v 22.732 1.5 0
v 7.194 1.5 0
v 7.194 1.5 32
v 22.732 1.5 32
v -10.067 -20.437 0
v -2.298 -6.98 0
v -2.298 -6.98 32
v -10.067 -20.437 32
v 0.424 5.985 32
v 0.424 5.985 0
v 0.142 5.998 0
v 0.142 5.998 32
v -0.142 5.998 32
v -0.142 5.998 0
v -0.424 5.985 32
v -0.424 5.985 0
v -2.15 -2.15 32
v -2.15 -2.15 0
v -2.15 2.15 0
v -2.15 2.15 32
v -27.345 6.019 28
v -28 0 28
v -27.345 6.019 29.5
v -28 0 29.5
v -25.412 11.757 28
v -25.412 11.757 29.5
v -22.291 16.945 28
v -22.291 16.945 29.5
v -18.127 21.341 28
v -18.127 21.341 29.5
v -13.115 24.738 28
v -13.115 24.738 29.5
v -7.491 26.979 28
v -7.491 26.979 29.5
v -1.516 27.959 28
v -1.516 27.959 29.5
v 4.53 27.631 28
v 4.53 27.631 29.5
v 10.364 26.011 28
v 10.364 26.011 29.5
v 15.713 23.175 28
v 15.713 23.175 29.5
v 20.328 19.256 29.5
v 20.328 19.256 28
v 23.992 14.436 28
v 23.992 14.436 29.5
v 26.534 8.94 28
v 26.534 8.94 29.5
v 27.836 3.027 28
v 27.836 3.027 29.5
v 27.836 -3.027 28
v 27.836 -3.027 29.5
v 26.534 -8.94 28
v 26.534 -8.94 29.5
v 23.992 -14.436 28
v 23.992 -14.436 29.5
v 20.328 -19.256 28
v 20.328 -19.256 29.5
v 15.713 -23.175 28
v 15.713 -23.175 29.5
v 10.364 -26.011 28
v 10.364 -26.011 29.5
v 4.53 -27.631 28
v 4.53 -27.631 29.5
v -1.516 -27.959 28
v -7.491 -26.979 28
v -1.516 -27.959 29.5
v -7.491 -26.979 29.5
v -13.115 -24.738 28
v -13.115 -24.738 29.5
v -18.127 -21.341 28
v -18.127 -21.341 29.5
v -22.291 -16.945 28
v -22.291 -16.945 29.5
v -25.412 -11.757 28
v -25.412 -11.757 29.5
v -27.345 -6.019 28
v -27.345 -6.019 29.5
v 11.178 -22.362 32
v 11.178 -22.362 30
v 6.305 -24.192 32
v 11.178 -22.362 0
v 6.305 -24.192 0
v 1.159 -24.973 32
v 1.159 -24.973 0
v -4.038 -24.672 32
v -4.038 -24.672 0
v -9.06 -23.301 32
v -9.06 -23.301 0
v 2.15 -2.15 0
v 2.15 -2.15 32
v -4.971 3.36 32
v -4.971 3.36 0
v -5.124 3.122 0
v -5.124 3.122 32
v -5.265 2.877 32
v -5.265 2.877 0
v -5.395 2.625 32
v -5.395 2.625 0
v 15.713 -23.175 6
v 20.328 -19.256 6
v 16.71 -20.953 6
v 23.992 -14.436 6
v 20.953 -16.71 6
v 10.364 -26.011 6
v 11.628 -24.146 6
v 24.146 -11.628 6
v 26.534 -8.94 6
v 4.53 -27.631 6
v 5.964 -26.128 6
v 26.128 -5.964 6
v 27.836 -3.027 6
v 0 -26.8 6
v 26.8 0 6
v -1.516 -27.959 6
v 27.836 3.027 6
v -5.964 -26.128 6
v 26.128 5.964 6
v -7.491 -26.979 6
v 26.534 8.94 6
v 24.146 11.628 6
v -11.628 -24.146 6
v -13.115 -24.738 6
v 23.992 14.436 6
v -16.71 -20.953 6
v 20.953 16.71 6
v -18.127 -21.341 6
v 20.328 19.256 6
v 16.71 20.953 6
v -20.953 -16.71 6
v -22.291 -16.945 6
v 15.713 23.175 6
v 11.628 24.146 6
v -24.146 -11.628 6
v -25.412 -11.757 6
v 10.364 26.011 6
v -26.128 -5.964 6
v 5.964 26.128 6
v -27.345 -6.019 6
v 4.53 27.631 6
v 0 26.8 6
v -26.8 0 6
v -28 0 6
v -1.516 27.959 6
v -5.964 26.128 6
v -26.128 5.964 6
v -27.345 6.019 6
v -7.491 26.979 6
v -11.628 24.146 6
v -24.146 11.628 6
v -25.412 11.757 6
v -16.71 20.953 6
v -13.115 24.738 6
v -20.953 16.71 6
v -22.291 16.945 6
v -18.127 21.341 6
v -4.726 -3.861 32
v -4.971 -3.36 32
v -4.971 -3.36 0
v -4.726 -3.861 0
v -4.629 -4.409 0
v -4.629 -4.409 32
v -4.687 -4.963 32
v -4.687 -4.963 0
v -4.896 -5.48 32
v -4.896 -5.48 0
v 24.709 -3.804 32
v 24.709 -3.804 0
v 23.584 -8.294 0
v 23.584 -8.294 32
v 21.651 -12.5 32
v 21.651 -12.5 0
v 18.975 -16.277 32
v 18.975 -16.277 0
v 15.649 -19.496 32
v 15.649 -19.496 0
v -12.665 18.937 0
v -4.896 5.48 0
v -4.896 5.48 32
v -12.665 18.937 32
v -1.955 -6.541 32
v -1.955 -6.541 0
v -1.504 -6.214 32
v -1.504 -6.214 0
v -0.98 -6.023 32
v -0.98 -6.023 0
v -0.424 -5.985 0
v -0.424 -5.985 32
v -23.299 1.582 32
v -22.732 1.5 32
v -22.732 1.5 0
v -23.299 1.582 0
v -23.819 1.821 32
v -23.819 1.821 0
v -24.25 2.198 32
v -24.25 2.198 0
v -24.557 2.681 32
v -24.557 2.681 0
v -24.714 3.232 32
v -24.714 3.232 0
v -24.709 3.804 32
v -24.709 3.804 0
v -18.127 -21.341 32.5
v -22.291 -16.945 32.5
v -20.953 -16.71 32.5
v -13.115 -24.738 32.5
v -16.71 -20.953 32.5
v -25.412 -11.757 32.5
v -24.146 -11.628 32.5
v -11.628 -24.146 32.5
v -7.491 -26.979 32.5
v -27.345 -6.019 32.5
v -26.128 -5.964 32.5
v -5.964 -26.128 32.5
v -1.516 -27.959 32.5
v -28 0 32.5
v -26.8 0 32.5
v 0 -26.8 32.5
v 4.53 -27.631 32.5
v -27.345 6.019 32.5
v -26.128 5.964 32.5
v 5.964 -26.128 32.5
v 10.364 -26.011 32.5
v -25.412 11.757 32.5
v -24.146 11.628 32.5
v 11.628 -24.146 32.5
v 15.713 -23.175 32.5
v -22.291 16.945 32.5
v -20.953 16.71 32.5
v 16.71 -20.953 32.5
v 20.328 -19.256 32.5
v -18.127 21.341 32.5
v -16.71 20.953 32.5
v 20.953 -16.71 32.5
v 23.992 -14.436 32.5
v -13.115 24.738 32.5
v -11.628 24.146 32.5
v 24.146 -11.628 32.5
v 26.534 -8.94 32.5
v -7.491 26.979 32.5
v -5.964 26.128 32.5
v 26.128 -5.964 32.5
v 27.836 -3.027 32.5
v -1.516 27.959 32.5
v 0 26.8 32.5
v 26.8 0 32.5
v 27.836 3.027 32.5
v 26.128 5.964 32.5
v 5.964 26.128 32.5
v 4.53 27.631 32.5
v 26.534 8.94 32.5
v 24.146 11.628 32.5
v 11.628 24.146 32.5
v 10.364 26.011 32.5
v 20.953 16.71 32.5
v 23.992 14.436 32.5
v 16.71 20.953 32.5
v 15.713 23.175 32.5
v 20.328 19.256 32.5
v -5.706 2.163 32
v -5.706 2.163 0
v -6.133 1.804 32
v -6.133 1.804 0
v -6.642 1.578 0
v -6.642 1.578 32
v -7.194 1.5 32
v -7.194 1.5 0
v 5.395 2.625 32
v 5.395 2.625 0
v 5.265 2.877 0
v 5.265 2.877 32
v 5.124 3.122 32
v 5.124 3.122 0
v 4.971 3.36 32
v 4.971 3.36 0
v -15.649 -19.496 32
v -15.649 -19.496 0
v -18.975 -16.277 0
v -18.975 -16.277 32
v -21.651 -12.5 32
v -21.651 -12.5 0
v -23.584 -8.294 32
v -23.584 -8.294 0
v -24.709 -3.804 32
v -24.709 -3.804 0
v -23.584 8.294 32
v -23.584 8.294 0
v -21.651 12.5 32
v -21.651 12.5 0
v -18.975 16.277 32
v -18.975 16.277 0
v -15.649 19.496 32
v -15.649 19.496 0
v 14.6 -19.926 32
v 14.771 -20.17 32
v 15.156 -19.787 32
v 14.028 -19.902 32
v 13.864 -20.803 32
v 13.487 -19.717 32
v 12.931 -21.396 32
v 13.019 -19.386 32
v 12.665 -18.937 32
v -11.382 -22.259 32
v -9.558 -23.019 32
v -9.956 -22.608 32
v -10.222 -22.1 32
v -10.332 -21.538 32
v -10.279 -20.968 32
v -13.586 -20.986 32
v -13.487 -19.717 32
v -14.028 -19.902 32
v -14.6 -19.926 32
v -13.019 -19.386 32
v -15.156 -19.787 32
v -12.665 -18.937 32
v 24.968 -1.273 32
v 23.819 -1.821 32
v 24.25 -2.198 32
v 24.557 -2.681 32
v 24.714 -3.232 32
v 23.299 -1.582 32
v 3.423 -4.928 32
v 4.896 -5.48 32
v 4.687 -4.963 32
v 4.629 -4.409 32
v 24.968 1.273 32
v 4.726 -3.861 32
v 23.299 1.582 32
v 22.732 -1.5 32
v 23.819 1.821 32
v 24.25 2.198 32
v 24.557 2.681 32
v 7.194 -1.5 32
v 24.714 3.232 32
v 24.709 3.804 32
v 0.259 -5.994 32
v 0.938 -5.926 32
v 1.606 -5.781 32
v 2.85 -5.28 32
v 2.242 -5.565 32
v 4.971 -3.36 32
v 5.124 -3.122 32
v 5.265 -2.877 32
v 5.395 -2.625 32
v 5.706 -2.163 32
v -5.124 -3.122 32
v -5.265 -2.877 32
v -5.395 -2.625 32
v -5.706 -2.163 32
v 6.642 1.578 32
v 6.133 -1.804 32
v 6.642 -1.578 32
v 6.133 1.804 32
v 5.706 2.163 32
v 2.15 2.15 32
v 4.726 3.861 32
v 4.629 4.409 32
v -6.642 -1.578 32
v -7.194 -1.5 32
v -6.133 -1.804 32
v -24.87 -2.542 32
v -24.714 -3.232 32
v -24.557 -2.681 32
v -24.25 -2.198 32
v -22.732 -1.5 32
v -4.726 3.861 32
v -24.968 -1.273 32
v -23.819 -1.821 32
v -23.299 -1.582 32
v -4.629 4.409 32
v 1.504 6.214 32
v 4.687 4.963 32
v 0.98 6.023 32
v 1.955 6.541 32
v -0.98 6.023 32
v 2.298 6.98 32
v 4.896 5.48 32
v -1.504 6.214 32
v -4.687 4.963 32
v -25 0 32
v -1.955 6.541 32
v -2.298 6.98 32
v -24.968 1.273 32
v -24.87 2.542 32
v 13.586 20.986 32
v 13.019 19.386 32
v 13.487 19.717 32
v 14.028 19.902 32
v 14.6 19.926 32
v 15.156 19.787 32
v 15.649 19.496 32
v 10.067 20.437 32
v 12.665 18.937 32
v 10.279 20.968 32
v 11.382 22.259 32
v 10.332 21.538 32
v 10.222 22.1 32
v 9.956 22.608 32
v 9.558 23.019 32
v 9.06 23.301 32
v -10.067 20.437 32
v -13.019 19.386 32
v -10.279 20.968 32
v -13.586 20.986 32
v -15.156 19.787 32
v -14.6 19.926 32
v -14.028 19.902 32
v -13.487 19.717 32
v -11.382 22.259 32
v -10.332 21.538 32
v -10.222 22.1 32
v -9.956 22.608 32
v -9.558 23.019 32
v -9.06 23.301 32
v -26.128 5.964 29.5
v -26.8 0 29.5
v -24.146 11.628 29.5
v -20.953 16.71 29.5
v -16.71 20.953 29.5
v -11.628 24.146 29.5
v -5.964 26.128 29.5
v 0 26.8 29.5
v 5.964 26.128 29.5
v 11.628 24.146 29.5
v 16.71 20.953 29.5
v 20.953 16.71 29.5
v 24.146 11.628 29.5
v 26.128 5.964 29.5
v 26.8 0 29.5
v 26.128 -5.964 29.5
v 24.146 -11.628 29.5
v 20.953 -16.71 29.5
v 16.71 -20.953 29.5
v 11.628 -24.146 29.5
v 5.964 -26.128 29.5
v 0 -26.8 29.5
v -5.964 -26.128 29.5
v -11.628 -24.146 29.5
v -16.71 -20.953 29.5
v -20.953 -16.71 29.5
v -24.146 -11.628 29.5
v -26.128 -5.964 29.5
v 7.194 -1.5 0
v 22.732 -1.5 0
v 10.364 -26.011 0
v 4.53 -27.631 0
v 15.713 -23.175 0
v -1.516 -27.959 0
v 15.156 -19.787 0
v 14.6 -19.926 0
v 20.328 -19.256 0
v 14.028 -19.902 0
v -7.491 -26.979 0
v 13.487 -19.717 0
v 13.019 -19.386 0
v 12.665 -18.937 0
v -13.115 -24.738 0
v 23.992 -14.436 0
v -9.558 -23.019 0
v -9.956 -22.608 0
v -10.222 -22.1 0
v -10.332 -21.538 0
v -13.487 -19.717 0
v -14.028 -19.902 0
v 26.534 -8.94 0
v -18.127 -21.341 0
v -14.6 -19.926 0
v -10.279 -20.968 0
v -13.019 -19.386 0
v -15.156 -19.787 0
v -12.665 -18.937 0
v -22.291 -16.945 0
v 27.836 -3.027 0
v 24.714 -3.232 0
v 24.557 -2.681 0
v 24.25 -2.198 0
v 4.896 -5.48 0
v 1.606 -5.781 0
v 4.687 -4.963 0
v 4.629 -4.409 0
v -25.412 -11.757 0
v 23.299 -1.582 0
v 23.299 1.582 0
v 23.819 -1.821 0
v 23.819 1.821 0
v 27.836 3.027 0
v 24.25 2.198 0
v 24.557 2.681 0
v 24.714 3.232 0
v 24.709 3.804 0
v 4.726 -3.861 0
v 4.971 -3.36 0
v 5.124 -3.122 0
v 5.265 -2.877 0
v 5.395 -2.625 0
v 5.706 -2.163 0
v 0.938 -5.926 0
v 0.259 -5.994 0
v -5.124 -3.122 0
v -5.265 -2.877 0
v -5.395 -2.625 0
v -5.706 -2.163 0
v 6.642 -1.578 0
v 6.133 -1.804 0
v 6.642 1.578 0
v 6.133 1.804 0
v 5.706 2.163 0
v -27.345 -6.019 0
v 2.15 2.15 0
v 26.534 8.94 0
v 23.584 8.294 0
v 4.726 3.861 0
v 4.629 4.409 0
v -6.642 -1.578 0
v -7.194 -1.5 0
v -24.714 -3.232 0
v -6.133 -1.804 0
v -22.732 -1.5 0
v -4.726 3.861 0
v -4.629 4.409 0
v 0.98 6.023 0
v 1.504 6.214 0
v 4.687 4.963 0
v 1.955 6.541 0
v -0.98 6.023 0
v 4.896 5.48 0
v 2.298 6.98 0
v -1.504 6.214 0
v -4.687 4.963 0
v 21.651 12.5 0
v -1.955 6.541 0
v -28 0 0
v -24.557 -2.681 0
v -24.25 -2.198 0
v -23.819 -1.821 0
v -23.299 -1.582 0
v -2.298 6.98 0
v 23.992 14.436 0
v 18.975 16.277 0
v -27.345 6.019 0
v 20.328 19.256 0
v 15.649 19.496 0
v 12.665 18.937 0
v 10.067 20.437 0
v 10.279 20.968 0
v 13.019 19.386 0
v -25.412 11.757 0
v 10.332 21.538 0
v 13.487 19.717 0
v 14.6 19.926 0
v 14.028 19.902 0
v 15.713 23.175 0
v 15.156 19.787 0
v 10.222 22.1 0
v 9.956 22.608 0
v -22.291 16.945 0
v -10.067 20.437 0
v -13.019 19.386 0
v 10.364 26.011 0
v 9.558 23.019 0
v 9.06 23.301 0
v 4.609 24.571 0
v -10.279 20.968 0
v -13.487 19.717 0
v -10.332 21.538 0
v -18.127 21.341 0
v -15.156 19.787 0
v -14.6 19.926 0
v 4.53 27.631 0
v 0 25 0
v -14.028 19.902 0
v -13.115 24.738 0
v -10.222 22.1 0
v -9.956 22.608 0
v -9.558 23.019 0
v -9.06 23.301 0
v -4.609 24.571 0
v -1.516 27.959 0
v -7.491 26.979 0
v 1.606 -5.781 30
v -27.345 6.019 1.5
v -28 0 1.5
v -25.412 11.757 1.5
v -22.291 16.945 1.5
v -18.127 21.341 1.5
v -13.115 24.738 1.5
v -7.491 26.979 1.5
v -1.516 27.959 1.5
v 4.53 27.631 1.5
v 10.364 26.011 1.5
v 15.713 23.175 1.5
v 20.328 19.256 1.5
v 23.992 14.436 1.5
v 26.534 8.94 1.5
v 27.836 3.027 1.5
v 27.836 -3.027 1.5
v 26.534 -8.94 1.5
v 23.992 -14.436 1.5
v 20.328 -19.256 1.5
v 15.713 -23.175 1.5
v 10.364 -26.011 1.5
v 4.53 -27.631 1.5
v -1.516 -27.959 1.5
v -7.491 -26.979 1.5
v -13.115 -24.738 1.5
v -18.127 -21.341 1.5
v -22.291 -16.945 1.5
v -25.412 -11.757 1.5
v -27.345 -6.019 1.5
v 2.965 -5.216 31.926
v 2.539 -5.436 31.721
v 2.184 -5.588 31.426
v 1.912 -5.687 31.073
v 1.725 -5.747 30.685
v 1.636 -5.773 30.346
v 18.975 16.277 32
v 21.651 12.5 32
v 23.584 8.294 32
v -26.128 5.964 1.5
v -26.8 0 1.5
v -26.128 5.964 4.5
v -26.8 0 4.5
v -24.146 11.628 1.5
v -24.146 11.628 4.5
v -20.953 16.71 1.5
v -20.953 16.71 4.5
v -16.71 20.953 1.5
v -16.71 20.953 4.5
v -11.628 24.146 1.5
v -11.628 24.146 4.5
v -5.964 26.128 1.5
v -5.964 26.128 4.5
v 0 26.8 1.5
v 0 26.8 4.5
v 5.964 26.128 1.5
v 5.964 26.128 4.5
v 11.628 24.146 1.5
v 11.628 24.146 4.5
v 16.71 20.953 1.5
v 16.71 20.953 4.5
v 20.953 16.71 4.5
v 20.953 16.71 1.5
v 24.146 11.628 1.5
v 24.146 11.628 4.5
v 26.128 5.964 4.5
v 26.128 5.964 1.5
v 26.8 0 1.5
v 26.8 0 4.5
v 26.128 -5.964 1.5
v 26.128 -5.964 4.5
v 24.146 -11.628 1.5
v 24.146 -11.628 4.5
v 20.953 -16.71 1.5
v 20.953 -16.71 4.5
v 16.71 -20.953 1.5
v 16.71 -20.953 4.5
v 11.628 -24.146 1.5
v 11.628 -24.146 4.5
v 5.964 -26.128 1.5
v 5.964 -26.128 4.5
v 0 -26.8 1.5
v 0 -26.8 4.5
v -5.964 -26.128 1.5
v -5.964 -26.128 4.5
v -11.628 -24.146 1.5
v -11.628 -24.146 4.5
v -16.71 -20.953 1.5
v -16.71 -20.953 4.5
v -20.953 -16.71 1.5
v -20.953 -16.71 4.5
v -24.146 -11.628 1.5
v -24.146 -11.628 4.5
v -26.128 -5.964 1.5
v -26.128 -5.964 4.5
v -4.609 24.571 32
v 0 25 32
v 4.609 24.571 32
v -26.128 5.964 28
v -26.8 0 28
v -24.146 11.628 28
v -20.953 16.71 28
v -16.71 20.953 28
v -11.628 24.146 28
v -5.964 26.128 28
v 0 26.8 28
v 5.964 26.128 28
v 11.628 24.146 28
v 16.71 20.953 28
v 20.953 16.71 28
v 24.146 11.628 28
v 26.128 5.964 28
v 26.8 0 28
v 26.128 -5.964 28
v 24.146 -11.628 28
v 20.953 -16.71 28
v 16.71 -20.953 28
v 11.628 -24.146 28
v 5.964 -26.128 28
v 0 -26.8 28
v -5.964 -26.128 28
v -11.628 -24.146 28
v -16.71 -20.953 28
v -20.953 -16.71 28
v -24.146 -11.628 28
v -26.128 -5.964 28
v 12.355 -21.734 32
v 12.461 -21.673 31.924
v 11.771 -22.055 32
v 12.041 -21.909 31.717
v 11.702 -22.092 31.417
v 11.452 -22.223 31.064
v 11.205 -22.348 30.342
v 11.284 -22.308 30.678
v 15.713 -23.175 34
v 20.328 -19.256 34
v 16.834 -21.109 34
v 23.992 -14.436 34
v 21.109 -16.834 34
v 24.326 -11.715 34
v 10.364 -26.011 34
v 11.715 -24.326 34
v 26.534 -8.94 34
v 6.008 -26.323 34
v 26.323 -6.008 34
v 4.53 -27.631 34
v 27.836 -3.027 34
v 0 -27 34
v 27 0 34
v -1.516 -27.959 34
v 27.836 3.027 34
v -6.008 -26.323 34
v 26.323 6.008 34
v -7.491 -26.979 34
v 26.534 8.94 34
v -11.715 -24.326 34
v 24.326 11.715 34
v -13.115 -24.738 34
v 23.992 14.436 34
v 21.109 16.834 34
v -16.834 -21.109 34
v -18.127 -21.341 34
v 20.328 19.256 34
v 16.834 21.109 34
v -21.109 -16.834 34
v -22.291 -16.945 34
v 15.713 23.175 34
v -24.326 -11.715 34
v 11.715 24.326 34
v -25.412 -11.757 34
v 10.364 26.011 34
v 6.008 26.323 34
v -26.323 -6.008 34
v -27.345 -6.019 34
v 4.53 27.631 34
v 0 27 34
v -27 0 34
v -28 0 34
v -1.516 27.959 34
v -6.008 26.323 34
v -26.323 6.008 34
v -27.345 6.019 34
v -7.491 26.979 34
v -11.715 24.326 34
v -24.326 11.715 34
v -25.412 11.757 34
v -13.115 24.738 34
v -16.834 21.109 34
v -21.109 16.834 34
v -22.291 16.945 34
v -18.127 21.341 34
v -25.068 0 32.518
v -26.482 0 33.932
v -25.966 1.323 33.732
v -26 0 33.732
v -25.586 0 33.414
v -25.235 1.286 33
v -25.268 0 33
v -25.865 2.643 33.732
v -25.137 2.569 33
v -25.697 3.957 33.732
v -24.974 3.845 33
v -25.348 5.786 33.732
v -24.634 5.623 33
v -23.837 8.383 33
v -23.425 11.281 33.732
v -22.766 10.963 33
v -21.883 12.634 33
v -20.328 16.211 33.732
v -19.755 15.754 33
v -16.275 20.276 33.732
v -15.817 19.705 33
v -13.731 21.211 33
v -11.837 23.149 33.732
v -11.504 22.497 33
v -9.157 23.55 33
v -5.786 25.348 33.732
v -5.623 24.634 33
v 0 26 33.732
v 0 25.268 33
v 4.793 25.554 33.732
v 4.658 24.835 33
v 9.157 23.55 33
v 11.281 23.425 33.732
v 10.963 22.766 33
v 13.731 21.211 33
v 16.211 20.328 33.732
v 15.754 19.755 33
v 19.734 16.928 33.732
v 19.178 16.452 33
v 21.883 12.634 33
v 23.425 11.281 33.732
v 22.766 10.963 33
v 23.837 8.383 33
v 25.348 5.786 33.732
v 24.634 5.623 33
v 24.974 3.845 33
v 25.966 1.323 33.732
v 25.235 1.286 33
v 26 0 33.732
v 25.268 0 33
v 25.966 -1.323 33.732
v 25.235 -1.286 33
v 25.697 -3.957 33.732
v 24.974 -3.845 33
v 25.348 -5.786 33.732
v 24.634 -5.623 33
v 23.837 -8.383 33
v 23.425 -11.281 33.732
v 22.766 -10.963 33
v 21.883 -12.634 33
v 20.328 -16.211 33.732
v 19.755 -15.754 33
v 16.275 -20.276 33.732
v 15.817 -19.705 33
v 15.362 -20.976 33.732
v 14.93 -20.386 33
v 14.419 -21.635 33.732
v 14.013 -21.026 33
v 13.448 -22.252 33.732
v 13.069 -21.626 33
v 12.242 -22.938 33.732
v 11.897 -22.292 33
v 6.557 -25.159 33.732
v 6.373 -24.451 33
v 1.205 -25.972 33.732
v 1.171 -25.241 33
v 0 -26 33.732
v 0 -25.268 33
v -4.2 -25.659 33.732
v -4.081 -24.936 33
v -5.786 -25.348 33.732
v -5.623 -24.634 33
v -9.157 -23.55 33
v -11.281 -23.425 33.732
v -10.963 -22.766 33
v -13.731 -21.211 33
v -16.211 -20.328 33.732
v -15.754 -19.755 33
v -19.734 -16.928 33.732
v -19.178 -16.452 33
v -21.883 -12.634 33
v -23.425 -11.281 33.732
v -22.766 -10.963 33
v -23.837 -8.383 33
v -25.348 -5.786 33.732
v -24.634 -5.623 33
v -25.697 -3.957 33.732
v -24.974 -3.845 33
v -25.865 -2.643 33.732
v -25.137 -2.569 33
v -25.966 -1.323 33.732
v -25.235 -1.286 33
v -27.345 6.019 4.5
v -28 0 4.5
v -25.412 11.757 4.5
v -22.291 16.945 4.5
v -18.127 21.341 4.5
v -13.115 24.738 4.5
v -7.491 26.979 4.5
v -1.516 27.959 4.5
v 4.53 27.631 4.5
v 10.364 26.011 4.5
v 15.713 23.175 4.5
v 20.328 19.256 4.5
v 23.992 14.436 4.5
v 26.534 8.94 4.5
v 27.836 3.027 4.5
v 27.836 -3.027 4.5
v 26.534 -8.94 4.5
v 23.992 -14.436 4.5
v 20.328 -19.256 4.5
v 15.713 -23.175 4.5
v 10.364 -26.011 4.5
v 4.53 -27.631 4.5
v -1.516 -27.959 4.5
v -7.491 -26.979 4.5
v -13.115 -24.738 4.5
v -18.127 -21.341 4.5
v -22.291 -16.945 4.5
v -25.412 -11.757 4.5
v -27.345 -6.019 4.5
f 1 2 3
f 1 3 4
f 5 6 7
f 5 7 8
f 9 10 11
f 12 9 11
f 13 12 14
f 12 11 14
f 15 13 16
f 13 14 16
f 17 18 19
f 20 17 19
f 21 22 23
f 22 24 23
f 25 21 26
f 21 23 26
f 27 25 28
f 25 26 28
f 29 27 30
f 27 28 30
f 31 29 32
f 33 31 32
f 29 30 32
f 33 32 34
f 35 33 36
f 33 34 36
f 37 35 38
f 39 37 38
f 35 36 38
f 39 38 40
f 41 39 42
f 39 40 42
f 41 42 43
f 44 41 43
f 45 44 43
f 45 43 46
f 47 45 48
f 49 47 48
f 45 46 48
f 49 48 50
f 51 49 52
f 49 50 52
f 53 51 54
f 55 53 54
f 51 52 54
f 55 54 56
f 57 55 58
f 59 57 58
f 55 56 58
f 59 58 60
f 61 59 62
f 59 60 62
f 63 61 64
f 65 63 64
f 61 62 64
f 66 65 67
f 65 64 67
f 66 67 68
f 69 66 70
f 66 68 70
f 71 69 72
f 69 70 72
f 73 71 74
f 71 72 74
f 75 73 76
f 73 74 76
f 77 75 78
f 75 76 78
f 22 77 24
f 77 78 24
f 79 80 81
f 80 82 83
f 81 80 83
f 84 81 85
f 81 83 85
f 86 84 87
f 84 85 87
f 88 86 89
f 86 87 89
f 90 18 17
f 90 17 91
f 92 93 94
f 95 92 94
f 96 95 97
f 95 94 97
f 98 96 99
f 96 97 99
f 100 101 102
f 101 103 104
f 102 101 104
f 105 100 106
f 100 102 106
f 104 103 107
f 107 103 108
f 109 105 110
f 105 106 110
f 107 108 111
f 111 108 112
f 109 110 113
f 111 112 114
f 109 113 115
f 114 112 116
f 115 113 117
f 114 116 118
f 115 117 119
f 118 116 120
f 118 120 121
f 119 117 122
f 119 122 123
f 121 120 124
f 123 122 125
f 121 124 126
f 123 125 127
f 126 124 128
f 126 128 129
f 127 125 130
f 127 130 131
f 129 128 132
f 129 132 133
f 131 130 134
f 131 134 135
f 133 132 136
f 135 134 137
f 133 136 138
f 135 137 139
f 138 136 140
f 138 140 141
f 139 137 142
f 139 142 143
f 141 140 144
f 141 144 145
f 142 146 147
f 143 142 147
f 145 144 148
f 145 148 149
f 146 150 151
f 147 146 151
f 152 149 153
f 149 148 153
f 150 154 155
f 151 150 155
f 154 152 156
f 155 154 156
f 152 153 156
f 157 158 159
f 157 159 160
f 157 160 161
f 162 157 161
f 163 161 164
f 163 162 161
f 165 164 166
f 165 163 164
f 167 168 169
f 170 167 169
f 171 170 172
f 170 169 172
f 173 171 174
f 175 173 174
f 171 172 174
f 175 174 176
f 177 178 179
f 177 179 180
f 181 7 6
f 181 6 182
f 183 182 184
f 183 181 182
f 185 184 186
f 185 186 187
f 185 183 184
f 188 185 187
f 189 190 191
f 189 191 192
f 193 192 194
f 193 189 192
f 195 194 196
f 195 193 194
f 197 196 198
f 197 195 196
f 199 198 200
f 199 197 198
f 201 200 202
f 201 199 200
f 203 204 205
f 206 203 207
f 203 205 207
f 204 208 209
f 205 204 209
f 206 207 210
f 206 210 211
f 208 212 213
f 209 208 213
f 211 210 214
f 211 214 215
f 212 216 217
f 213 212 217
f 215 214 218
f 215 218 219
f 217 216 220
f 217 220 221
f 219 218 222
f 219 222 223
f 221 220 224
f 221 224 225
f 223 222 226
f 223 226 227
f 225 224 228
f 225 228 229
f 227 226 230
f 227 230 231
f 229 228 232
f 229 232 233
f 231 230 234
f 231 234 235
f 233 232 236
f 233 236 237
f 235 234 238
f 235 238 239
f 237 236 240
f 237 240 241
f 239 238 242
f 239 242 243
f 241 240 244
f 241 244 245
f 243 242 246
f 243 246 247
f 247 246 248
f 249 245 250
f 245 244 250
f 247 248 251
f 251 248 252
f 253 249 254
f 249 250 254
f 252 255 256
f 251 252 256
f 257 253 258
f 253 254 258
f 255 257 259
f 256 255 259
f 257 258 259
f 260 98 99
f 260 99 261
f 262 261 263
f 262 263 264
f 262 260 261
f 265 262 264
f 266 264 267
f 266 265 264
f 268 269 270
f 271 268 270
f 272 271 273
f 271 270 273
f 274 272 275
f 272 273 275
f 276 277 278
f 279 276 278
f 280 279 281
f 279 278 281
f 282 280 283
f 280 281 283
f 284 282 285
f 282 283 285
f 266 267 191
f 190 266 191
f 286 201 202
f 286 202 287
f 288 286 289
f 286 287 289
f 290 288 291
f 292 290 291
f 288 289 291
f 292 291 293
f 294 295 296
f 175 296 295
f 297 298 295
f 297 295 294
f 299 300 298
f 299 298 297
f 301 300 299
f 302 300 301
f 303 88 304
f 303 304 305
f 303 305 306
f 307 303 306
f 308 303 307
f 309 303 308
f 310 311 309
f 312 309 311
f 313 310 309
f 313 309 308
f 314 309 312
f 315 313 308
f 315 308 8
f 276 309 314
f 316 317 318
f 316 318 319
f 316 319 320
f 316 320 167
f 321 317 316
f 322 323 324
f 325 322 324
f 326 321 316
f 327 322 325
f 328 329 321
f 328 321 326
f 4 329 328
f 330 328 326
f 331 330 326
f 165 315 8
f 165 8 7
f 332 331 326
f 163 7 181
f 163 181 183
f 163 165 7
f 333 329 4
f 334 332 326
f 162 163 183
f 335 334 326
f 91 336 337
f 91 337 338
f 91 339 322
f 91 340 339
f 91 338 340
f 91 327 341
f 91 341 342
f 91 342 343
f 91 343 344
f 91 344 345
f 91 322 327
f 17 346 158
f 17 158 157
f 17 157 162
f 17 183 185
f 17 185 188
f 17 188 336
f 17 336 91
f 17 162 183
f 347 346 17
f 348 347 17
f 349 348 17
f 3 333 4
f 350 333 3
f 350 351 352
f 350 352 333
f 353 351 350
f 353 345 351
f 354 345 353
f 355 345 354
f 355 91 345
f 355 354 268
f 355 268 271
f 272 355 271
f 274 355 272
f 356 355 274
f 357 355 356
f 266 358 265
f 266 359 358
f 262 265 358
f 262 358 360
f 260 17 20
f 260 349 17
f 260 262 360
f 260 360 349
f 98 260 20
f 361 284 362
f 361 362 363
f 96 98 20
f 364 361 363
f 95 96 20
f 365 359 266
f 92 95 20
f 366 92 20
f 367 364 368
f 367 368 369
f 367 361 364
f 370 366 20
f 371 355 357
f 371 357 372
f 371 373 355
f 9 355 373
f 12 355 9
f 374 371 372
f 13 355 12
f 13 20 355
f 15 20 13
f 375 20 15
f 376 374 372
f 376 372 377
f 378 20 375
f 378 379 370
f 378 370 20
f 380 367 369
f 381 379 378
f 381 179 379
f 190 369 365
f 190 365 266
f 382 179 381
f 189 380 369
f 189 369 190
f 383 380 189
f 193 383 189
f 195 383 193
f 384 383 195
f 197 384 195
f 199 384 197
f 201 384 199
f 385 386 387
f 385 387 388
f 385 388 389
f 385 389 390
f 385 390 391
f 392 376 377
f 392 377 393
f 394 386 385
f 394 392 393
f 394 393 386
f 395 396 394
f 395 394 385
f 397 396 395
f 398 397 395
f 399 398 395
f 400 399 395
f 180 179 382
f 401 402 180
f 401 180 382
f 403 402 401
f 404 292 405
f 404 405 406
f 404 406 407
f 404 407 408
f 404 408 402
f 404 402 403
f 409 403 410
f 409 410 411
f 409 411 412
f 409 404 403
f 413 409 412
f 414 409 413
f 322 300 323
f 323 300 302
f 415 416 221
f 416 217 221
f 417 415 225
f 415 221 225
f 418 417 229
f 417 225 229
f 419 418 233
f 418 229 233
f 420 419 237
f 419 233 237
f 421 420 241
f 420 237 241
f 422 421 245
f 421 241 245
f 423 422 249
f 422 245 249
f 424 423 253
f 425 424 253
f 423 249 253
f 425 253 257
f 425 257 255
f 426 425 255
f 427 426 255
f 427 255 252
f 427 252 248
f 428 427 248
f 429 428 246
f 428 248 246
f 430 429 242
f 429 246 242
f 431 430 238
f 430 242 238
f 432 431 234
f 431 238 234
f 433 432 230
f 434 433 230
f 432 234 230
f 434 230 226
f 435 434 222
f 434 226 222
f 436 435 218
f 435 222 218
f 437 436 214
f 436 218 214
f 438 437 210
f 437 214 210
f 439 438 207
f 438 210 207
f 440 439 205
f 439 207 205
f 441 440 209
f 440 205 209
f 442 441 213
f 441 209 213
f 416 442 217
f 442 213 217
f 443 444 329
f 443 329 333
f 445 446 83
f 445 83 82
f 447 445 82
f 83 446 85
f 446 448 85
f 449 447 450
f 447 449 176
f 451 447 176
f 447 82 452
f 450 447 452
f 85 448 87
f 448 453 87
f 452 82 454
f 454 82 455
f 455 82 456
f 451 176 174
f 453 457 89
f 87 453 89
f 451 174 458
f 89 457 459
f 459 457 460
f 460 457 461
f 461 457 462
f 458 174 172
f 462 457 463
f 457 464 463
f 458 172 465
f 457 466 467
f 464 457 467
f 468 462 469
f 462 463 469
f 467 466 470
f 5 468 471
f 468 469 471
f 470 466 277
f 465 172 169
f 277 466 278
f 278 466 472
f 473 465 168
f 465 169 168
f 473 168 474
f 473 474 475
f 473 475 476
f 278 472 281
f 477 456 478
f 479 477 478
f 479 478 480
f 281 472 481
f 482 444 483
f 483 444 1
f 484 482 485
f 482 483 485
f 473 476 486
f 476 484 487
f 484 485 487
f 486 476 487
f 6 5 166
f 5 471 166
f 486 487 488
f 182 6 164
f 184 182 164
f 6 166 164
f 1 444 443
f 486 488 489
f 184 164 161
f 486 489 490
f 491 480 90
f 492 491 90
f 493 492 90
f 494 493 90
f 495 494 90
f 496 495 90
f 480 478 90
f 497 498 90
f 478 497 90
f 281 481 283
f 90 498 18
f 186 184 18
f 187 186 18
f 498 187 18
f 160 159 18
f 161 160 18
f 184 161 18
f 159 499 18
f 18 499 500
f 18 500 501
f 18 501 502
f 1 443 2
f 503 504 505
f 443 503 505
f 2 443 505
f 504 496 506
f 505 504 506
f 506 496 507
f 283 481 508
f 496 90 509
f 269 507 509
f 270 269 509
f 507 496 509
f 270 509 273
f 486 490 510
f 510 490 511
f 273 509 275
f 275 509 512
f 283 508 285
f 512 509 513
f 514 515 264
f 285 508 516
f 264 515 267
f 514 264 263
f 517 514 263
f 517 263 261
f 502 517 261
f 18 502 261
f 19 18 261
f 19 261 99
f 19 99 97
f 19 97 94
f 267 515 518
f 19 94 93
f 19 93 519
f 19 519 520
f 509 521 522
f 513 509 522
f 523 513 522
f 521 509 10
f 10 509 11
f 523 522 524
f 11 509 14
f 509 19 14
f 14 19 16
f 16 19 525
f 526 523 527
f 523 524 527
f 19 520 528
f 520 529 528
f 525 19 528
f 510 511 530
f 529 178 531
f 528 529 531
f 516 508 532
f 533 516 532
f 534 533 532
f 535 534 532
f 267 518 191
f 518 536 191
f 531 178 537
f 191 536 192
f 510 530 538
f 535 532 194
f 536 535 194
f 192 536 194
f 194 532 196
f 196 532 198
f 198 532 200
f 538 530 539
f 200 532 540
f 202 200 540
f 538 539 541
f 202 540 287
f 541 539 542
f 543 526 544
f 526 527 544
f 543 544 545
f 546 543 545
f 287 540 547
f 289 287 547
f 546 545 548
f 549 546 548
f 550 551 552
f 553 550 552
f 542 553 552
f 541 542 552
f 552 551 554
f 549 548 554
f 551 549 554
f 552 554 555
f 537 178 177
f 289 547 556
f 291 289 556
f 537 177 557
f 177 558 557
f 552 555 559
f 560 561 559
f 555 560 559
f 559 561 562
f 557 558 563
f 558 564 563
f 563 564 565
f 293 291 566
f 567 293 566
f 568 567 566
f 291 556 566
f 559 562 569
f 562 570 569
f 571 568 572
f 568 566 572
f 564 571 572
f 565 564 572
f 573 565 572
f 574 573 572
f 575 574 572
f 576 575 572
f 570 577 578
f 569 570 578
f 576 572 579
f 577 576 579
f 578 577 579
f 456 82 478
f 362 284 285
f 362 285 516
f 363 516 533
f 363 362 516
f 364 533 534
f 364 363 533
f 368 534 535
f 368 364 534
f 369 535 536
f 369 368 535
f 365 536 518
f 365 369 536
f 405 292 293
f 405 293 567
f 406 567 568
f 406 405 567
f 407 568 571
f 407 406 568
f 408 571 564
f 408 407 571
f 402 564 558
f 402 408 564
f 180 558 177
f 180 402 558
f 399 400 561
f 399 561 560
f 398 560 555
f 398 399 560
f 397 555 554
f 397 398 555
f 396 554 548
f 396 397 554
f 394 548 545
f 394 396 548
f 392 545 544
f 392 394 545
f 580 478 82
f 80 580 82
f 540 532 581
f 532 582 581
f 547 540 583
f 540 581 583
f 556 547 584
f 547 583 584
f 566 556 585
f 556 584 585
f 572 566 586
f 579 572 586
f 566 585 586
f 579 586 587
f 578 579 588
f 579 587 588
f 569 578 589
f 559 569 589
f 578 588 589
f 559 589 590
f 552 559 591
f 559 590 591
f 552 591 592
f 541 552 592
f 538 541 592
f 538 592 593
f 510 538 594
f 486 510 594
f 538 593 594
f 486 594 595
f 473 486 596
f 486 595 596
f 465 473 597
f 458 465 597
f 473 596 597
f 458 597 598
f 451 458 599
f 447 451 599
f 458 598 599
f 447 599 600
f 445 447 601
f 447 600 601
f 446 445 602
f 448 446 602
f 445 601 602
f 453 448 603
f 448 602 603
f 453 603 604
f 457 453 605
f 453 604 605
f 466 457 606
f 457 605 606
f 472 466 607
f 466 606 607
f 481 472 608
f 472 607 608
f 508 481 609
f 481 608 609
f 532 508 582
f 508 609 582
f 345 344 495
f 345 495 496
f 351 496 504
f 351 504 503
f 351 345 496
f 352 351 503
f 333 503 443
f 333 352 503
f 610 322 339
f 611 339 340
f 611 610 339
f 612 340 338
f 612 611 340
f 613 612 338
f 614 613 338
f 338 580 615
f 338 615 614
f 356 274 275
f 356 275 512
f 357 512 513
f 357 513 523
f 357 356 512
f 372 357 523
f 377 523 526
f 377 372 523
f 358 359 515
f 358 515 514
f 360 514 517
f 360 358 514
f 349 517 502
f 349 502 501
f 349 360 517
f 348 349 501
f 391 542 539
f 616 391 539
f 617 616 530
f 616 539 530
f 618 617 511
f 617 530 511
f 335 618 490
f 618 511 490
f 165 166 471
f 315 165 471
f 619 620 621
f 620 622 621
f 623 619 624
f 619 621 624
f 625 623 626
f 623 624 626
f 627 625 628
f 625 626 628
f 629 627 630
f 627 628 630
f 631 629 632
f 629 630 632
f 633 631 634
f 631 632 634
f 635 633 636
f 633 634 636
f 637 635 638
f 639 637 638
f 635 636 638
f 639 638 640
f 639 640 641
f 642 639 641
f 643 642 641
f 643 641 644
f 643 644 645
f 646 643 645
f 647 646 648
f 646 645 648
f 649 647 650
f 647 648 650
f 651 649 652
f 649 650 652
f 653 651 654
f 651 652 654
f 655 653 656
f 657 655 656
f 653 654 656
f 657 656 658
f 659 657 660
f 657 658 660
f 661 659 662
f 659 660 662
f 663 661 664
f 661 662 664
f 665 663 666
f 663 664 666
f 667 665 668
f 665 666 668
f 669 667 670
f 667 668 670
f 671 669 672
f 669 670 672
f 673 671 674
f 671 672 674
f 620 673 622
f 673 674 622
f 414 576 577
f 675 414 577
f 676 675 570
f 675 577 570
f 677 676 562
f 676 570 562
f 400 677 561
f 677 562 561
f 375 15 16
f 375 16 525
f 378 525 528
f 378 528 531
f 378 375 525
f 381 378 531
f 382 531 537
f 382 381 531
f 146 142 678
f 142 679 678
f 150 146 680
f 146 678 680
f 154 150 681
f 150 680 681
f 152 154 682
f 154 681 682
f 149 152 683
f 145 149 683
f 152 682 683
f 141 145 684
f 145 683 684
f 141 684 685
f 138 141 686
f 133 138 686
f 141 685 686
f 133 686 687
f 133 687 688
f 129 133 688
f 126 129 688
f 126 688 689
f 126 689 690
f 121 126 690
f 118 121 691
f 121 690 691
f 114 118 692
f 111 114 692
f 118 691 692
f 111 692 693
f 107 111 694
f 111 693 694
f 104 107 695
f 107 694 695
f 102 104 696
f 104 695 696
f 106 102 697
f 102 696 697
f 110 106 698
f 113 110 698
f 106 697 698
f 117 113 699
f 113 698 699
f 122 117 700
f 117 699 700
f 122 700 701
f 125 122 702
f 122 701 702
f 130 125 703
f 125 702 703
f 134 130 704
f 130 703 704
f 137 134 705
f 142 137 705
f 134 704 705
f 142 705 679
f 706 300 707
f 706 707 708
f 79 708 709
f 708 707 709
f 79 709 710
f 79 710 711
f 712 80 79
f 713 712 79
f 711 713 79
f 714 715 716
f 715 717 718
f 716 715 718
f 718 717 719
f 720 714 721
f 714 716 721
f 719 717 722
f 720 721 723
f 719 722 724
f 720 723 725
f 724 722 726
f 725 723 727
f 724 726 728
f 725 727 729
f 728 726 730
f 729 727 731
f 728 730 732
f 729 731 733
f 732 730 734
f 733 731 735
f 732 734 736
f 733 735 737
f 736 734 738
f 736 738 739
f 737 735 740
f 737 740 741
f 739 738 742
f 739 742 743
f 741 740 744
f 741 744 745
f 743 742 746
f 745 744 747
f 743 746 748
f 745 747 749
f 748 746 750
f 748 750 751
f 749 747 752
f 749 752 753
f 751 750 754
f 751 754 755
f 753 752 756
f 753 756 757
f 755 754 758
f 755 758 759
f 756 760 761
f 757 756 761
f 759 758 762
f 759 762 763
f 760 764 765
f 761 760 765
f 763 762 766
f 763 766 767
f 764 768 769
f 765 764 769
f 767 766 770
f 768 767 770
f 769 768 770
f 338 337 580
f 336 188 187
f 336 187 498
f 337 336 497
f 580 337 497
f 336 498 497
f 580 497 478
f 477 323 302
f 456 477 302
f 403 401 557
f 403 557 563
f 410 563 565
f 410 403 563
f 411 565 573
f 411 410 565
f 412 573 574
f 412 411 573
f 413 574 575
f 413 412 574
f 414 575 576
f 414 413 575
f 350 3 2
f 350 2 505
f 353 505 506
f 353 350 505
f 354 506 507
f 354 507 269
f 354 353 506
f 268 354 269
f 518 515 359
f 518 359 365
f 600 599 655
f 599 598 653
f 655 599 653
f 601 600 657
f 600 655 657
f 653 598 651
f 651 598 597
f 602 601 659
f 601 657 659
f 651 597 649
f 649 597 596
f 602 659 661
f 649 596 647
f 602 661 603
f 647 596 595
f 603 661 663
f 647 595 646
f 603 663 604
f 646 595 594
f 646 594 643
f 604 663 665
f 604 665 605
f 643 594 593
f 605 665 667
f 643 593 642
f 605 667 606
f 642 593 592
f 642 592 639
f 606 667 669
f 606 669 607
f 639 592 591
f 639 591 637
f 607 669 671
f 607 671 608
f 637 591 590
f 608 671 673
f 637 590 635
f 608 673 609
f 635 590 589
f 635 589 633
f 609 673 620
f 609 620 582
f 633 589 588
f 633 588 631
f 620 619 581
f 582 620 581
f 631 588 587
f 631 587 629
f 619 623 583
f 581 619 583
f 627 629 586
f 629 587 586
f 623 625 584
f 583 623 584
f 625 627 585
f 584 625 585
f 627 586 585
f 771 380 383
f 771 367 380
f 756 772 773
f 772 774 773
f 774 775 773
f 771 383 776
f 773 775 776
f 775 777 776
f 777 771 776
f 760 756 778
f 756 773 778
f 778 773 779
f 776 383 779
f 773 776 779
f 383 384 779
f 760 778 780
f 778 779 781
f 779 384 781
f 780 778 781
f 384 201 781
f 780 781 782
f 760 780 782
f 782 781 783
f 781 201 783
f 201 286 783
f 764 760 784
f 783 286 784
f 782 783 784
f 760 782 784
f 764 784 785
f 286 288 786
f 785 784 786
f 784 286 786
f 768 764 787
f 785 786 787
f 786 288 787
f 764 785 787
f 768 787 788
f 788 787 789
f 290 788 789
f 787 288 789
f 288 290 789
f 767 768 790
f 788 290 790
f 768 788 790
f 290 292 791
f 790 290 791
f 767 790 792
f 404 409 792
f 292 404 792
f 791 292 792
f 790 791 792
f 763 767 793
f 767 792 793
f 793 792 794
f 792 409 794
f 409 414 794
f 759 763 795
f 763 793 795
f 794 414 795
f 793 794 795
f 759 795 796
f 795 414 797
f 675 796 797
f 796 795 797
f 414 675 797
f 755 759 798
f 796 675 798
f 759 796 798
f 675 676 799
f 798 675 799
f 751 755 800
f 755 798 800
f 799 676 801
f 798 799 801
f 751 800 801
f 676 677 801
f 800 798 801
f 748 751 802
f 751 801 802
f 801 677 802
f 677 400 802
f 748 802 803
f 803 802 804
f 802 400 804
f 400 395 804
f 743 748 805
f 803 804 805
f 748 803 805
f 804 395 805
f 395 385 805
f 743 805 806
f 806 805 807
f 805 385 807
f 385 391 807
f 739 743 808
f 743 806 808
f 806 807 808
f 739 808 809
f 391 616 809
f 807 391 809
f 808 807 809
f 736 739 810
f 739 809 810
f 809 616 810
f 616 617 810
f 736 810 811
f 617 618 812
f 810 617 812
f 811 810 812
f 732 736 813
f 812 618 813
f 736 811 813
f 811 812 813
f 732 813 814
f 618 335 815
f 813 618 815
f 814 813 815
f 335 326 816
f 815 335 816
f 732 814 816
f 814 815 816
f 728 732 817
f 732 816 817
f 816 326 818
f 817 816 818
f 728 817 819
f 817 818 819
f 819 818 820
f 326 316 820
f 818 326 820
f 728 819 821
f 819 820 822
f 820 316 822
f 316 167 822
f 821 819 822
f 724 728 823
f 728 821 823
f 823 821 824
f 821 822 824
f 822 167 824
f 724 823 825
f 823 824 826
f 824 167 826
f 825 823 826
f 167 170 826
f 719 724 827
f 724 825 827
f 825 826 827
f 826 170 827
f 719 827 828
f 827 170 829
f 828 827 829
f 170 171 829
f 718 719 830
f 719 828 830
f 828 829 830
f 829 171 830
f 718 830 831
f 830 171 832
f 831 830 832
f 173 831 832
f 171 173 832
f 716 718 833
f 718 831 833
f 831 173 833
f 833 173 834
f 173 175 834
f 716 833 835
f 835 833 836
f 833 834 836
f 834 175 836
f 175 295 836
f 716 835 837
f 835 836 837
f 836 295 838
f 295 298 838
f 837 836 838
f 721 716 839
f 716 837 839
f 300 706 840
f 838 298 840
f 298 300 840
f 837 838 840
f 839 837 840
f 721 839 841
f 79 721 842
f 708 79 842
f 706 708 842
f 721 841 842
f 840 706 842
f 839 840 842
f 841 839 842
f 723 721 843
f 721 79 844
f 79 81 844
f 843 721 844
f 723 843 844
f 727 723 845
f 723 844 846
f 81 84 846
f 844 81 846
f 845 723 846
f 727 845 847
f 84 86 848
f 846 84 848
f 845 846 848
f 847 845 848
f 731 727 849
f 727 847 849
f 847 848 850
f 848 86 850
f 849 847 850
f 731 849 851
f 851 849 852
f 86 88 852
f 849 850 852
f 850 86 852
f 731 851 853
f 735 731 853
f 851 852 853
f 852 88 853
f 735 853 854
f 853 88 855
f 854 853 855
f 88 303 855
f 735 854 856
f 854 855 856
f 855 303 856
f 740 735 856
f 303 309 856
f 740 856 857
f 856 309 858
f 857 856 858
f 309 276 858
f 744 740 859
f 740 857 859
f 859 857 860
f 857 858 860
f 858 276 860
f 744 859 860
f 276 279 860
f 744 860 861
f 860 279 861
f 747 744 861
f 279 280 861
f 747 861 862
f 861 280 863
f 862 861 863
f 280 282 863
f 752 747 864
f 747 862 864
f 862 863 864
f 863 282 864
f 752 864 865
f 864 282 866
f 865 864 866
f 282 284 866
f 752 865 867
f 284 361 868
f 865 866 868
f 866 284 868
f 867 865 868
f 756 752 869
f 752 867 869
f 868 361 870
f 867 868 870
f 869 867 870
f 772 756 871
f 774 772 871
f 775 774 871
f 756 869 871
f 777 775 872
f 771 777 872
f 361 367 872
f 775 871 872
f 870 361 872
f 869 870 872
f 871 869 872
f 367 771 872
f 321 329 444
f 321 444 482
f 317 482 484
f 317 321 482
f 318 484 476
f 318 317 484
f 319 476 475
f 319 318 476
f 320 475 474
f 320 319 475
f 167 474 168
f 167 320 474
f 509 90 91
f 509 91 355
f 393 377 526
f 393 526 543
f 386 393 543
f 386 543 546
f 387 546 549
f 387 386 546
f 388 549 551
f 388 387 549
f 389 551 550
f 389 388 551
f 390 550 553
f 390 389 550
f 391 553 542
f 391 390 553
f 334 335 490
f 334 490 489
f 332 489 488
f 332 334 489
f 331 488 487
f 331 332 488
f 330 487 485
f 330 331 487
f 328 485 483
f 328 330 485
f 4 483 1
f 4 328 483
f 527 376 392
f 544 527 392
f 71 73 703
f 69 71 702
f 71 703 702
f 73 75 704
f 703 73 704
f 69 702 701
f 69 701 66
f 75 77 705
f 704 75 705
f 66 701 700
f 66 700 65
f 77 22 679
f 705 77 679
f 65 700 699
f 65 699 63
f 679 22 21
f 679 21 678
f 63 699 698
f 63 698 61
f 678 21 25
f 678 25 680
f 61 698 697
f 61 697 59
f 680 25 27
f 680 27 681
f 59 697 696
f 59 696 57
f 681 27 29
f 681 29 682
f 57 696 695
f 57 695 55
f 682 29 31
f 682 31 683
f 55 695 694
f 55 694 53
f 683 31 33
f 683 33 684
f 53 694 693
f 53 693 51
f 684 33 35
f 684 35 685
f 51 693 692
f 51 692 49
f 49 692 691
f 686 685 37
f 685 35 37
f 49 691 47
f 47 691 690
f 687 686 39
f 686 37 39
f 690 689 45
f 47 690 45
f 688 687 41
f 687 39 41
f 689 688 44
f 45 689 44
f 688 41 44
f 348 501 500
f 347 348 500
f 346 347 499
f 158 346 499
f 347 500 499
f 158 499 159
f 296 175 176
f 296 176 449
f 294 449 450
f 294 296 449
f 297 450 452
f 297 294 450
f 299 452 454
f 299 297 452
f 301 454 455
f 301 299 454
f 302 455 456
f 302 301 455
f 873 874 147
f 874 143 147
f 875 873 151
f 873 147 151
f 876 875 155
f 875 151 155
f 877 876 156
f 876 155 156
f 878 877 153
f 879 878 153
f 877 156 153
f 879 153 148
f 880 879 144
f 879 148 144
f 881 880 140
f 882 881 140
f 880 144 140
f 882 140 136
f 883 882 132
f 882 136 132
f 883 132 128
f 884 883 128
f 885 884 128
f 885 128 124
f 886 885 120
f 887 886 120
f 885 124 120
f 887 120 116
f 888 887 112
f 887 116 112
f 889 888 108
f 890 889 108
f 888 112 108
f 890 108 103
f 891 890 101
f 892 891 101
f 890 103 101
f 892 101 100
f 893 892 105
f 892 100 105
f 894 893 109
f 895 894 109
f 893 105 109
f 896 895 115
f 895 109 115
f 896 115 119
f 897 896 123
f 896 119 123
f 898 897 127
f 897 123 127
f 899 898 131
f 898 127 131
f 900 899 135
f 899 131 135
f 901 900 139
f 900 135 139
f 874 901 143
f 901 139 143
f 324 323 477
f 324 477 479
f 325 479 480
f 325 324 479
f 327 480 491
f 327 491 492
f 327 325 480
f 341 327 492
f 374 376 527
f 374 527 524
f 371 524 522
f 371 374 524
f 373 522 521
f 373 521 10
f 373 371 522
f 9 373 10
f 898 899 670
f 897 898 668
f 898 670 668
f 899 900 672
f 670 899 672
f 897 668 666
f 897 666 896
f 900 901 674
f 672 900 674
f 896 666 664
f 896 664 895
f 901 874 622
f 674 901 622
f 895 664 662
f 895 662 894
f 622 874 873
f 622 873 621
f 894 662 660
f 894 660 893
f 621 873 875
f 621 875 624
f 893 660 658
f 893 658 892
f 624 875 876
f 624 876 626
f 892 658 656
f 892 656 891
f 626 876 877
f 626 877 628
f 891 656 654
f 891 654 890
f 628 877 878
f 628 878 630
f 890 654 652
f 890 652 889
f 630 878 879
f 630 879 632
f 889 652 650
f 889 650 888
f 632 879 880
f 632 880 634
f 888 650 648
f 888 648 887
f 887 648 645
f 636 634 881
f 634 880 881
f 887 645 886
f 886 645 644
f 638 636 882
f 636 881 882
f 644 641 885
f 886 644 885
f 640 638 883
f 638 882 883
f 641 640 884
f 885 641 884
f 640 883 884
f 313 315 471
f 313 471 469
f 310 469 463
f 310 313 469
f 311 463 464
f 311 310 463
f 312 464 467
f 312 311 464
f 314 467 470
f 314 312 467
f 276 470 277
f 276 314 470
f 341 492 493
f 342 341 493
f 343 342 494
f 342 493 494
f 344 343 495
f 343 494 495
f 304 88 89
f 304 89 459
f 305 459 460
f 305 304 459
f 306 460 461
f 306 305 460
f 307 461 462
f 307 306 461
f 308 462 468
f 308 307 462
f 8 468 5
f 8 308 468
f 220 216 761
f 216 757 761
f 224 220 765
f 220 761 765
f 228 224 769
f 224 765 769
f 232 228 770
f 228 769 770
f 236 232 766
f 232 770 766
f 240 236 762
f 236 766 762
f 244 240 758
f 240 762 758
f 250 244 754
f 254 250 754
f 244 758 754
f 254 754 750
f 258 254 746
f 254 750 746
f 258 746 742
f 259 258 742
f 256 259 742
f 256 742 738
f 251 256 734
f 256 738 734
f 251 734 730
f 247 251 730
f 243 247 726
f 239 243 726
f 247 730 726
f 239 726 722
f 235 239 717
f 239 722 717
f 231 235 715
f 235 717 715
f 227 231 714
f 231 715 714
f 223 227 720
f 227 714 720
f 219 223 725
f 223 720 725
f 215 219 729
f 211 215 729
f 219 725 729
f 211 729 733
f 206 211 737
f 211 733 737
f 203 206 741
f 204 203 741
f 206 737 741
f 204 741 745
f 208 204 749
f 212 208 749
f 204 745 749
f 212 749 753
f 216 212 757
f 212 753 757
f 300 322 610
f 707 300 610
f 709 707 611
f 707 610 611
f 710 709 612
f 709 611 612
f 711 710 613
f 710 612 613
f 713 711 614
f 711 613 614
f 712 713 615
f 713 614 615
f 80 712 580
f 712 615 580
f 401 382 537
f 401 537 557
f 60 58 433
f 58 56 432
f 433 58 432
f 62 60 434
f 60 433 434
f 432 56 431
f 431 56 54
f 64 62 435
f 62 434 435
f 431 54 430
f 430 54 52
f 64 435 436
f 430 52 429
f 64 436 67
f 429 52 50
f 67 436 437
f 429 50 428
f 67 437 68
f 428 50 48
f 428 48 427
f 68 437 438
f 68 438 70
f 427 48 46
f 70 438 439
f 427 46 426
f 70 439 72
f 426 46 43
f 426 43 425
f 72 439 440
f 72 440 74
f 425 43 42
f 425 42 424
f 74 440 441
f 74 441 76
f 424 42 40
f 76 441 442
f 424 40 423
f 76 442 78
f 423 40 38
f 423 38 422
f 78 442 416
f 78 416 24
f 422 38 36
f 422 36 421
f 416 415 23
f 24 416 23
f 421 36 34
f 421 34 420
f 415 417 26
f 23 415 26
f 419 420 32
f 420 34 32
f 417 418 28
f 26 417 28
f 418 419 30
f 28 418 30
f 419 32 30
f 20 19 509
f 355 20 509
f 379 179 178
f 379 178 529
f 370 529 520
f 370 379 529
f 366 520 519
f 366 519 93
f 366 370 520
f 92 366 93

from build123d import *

# Parameters (mm, degrees)
SKETCH2_W           = 25
SKETCH2_H           = 3
BOSS_EXTRUDE1_DEPTH = 32
CIRPATTERN1_COUNT   = 6
SKETCH5_R           = 6
BOSS_EXTRUDE2_DEPTH = 32
SKETCH6_W           = 4.3
SKETCH6_H           = 4.3
AXLEHOLE_DEPTH      = 53.191951405
FILLET1_R           = 2


with BuildPart() as part:
    # Sketch1 → Revolve1 (revolve)
    with BuildSketch(Plane.XZ, mode=Mode.PRIVATE) as revolve1_sk:
        with BuildLine():
            Line((25, 0), (28, 0))
            Line((28, 0), (28, 1.5))
            Line((28, 1.5), (26.8, 1.5))
            Line((26.8, 1.5), (26.8, 4.5))
            Line((26.8, 4.5), (28, 4.5))
            Line((28, 4.5), (28, 6))
            Line((28, 6), (26.8, 6))
            Line((26.8, 6), (26.8, 28))
            Line((26.8, 28), (28, 28))
            Line((28, 28), (28, 29.5))
            Line((28, 29.5), (26.8, 29.5))
            Line((26.8, 29.5), (26.8, 32.5))
            Line((26.8, 32.5), (28, 32.5))
            Line((28, 32.5), (28, 33.999996833))
            Line((28, 33.999996833), (27, 33.999996833))
            ThreePointArc((27, 33.999996833), (25.585786438, 33.414213562), (25, 32))
            Line((25, 32), (25, 0))
        make_face()
    revolve(revolve1_sk.sketch.rotate(Axis((0, 0, 34), (0, 0, -1)), 180), axis=Axis((0, 0, 34), (0, 0, -1)))

    # Sketch2 → Boss-Extrude1 (add)
    with BuildSketch(Plane.XY):
        with Locations((12.5, 0)):
            Rectangle(SKETCH2_W, SKETCH2_H)
    boss_extrude1 = extrude(amount=BOSS_EXTRUDE1_DEPTH)

    # CirPattern1: Boss-Extrude1 ×6 about axis
    cirpattern1_axis = Axis((0, 0, 0), (0, 0, 1))
    for i in range(1, CIRPATTERN1_COUNT):
        add(boss_extrude1.rotate(cirpattern1_axis, i * 360 / CIRPATTERN1_COUNT))

    # Sketch5 → Boss-Extrude2 (add)
    with BuildSketch(Plane.XY):
        Circle(SKETCH5_R)
    extrude(amount=BOSS_EXTRUDE2_DEPTH)

    # Sketch6 → AxleHole (cut, through all)
    with BuildSketch(Plane.XY):
        Rectangle(SKETCH6_W, SKETCH6_H)
    extrude(amount=AXLEHOLE_DEPTH, mode=Mode.SUBTRACT)

    # Fillet1
    # the kernel refuses this fillet: 2 mm, written as the material it adds along each edge
    with BuildSketch(Plane(origin=(-24.954959427, -1.5, 32), x_dir=(0.10620109039764976, -0.9943446728365121, 0), z_dir=(0, 0, -1))) as fillet1_piece_1:
        with BuildLine():
            CenterArc((2.224755634, -1.997850608), FILLET1_R, 87.343441845, 98.752929077)
            Line((0.236066288, -2.210252789), (0, 0))
            ThreePointArc((0, 0), (1.158726893, 0.026867397), (2.317453785, 0))
        make_face()
    extrude(amount=32)
    with BuildSketch(Plane(origin=(-13.776517819, -20.861628814, 32), x_dir=(-0.8080272015953212, 0.589145178612228, 0), z_dir=(0, 0, -1)), Plane(origin=(13.776517819, 20.861628814, 32), x_dir=(0.8080272015953204, -0.589145178612229, 0), z_dir=(0, 0, -1)), Plane(origin=(24.954959427, -1.5, 32), x_dir=(-0.10620109039765001, -0.994344672836512, 0), z_dir=(0, 0, -1)), Plane(origin=(-11.178441608, 22.361628814, 32), x_dir=(0.9142282919929712, 0.405199494224283, 0), z_dir=(0, 0, -1)), Plane(origin=(-24.954959427, 1.5, 32), x_dir=(0.10620109039765026, 0.994344672836512, 0), z_dir=(0, 0, -1))) as fillet1_piece_2:
        with BuildLine():
            CenterArc((2.224755634, 1.997850608), FILLET1_R, 173.903629078, 98.752929077)
            Line((0.236066288, 2.210252789), (0, 0))
            ThreePointArc((0, 0), (1.158726893, -0.026867397), (2.317453785, 0))
        make_face()
    extrude(amount=32)
    with BuildSketch(Plane(origin=(-11.178441608, -22.361628814, 32), x_dir=(0.4999999999999988, 0.8660254037844393, 0), z_dir=(0, 0, -1)), Plane(origin=(13.776517819, -20.861628814, 32), x_dir=(-0.500000000000002, 0.8660254037844375, 0), z_dir=(0, 0, -1)), Plane(origin=(24.954959427, 1.5, 32), x_dir=(-1, 0, 0), z_dir=(0, 0, -1)), Plane(origin=(11.178441608, 22.361628814, 32), x_dir=(-0.5000000000000002, -0.8660254037844387, 0), z_dir=(0, 0, -1)), Plane(origin=(-13.776517819, 20.861628814, 32), x_dir=(0.5000000000000002, -0.8660254037844387, 0), z_dir=(0, 0, -1))) as fillet1_piece_3:
        with BuildLine():
            CenterArc((2.222823584, 2), FILLET1_R, 171.247070923, 98.752929077)
            ThreePointArc((0.246116119, 2.304347826), (0.096342606, 1.15502726), (0, 0))
            Line((0, 0), (2.222823584, 0))
        make_face()
    extrude(amount=32)
    with BuildSketch(Plane(origin=(5.809475019, 1.5, 32), x_dir=(1, 0, 0), z_dir=(0, 0, -1)), Plane(origin=(4.203775615, -4.281152949, 32), x_dir=(0.5000000000000001, -0.8660254037844386, 0), z_dir=(0, 0, -1)), Plane(origin=(1.605699404, 5.781152949, 32), x_dir=(0.4999999999999986, 0.8660254037844394, 0), z_dir=(0, 0, -1)), Plane(origin=(-4.203775615, 4.281152949, 32), x_dir=(-0.5000000000000004, 0.8660254037844384, 0), z_dir=(0, 0, -1)), Plane(origin=(-5.809475019, -1.5, 32), x_dir=(-1, 0, 0), z_dir=(0, 0, -1)), Plane(origin=(-1.605699404, -5.781152949, 32), x_dir=(-0.4999999999999988, -0.8660254037844393, 0), z_dir=(0, 0, -1))) as fillet1_piece_4:
        with BuildLine():
            CenterArc((1.384272266, -2), FILLET1_R, 90, 64.055520228)
            ThreePointArc((-0.414164556, -1.125), (-0.178914596, -0.572869827), (0, 0))
            Line((0, 0), (1.384272266, 0))
        make_face()
    extrude(amount=32)
    with BuildSketch(Plane(origin=(4.203775615, 4.281152949, 32), x_dir=(0.6399622417657335, -0.7684063567632539, 0), z_dir=(0, 0, -1)), Plane(origin=(5.809475019, -1.5, 32), x_dir=(-0.3454783045035584, -0.9384267372135913, 0), z_dir=(0, 0, -1)), Plane(origin=(-1.605699404, 5.781152949, 32), x_dir=(0.9854405462692932, 0.1700203804503366, 0), z_dir=(0, 0, -1)), Plane(origin=(-5.809475019, 1.5, 32), x_dir=(0.3454783045035597, 0.9384267372135907, 0), z_dir=(0, 0, -1))) as fillet1_piece_5:
        with BuildLine():
            CenterArc((1.398617439, -1.989994715), FILLET1_R, 95.733483793, 64.055520228)
            Line((-0.478236035, -1.299038106), (0, 0))
            ThreePointArc((0, 0), (0.599407474, -0.030015856), (1.198814948, 0))
        make_face()
    extrude(amount=32)
    with BuildSketch(Plane(origin=(-4.203775615, -4.281152949, 32), x_dir=(-0.4999999999999996, -0.8660254037844388, 0), z_dir=(0, 0, -1))) as fillet1_piece_6:
        with BuildLine():
            CenterArc((1.384272266, 2), FILLET1_R, 205.944479772, 64.055520228)
            ThreePointArc((-0.414164556, 1.125), (-0.178914596, 0.572869827), (0, 0))
            Line((0, 0), (1.384272266, 0))
        make_face()
    extrude(amount=32)
    # the kernel refuses this fillet: 2 mm, written as the material it takes off along each edge
    with BuildSketch(Plane(origin=(-0.894300596, -1.45102593, 32), x_dir=(0.8660254037844386, 0.5000000000000003, 0), z_dir=(0.5000000000000003, -0.8660254037844386, 0))) as fillet1_2_piece_1_section:
        with BuildLine():
            CenterArc((FILLET1_R, -FILLET1_R), FILLET1_R, 90, 90)
            Line((0, -FILLET1_R), (0, 0))
            Line((0, 0), (FILLET1_R, 0))
        make_face()
    fillet1_2_piece_1 = extrude(amount=29.145484408, mode=Mode.PRIVATE)
    fillet1_2_piece_1 = fillet1_2_piece_1 & Plane(origin=(0, 0, 32), x_dir=(-1, 0, 0), z_dir=(0, 0, -1)) * Cylinder(25, 67, mode=Mode.PRIVATE)
    fillet1_2_piece_1 = fillet1_2_piece_1 - Plane(origin=(0, 0, 32), x_dir=(1, 0, 0), z_dir=(0, 0, -1)) * Cylinder(6, 67, mode=Mode.PRIVATE)
    add(fillet1_2_piece_1, mode=Mode.SUBTRACT)


solid = part.part
